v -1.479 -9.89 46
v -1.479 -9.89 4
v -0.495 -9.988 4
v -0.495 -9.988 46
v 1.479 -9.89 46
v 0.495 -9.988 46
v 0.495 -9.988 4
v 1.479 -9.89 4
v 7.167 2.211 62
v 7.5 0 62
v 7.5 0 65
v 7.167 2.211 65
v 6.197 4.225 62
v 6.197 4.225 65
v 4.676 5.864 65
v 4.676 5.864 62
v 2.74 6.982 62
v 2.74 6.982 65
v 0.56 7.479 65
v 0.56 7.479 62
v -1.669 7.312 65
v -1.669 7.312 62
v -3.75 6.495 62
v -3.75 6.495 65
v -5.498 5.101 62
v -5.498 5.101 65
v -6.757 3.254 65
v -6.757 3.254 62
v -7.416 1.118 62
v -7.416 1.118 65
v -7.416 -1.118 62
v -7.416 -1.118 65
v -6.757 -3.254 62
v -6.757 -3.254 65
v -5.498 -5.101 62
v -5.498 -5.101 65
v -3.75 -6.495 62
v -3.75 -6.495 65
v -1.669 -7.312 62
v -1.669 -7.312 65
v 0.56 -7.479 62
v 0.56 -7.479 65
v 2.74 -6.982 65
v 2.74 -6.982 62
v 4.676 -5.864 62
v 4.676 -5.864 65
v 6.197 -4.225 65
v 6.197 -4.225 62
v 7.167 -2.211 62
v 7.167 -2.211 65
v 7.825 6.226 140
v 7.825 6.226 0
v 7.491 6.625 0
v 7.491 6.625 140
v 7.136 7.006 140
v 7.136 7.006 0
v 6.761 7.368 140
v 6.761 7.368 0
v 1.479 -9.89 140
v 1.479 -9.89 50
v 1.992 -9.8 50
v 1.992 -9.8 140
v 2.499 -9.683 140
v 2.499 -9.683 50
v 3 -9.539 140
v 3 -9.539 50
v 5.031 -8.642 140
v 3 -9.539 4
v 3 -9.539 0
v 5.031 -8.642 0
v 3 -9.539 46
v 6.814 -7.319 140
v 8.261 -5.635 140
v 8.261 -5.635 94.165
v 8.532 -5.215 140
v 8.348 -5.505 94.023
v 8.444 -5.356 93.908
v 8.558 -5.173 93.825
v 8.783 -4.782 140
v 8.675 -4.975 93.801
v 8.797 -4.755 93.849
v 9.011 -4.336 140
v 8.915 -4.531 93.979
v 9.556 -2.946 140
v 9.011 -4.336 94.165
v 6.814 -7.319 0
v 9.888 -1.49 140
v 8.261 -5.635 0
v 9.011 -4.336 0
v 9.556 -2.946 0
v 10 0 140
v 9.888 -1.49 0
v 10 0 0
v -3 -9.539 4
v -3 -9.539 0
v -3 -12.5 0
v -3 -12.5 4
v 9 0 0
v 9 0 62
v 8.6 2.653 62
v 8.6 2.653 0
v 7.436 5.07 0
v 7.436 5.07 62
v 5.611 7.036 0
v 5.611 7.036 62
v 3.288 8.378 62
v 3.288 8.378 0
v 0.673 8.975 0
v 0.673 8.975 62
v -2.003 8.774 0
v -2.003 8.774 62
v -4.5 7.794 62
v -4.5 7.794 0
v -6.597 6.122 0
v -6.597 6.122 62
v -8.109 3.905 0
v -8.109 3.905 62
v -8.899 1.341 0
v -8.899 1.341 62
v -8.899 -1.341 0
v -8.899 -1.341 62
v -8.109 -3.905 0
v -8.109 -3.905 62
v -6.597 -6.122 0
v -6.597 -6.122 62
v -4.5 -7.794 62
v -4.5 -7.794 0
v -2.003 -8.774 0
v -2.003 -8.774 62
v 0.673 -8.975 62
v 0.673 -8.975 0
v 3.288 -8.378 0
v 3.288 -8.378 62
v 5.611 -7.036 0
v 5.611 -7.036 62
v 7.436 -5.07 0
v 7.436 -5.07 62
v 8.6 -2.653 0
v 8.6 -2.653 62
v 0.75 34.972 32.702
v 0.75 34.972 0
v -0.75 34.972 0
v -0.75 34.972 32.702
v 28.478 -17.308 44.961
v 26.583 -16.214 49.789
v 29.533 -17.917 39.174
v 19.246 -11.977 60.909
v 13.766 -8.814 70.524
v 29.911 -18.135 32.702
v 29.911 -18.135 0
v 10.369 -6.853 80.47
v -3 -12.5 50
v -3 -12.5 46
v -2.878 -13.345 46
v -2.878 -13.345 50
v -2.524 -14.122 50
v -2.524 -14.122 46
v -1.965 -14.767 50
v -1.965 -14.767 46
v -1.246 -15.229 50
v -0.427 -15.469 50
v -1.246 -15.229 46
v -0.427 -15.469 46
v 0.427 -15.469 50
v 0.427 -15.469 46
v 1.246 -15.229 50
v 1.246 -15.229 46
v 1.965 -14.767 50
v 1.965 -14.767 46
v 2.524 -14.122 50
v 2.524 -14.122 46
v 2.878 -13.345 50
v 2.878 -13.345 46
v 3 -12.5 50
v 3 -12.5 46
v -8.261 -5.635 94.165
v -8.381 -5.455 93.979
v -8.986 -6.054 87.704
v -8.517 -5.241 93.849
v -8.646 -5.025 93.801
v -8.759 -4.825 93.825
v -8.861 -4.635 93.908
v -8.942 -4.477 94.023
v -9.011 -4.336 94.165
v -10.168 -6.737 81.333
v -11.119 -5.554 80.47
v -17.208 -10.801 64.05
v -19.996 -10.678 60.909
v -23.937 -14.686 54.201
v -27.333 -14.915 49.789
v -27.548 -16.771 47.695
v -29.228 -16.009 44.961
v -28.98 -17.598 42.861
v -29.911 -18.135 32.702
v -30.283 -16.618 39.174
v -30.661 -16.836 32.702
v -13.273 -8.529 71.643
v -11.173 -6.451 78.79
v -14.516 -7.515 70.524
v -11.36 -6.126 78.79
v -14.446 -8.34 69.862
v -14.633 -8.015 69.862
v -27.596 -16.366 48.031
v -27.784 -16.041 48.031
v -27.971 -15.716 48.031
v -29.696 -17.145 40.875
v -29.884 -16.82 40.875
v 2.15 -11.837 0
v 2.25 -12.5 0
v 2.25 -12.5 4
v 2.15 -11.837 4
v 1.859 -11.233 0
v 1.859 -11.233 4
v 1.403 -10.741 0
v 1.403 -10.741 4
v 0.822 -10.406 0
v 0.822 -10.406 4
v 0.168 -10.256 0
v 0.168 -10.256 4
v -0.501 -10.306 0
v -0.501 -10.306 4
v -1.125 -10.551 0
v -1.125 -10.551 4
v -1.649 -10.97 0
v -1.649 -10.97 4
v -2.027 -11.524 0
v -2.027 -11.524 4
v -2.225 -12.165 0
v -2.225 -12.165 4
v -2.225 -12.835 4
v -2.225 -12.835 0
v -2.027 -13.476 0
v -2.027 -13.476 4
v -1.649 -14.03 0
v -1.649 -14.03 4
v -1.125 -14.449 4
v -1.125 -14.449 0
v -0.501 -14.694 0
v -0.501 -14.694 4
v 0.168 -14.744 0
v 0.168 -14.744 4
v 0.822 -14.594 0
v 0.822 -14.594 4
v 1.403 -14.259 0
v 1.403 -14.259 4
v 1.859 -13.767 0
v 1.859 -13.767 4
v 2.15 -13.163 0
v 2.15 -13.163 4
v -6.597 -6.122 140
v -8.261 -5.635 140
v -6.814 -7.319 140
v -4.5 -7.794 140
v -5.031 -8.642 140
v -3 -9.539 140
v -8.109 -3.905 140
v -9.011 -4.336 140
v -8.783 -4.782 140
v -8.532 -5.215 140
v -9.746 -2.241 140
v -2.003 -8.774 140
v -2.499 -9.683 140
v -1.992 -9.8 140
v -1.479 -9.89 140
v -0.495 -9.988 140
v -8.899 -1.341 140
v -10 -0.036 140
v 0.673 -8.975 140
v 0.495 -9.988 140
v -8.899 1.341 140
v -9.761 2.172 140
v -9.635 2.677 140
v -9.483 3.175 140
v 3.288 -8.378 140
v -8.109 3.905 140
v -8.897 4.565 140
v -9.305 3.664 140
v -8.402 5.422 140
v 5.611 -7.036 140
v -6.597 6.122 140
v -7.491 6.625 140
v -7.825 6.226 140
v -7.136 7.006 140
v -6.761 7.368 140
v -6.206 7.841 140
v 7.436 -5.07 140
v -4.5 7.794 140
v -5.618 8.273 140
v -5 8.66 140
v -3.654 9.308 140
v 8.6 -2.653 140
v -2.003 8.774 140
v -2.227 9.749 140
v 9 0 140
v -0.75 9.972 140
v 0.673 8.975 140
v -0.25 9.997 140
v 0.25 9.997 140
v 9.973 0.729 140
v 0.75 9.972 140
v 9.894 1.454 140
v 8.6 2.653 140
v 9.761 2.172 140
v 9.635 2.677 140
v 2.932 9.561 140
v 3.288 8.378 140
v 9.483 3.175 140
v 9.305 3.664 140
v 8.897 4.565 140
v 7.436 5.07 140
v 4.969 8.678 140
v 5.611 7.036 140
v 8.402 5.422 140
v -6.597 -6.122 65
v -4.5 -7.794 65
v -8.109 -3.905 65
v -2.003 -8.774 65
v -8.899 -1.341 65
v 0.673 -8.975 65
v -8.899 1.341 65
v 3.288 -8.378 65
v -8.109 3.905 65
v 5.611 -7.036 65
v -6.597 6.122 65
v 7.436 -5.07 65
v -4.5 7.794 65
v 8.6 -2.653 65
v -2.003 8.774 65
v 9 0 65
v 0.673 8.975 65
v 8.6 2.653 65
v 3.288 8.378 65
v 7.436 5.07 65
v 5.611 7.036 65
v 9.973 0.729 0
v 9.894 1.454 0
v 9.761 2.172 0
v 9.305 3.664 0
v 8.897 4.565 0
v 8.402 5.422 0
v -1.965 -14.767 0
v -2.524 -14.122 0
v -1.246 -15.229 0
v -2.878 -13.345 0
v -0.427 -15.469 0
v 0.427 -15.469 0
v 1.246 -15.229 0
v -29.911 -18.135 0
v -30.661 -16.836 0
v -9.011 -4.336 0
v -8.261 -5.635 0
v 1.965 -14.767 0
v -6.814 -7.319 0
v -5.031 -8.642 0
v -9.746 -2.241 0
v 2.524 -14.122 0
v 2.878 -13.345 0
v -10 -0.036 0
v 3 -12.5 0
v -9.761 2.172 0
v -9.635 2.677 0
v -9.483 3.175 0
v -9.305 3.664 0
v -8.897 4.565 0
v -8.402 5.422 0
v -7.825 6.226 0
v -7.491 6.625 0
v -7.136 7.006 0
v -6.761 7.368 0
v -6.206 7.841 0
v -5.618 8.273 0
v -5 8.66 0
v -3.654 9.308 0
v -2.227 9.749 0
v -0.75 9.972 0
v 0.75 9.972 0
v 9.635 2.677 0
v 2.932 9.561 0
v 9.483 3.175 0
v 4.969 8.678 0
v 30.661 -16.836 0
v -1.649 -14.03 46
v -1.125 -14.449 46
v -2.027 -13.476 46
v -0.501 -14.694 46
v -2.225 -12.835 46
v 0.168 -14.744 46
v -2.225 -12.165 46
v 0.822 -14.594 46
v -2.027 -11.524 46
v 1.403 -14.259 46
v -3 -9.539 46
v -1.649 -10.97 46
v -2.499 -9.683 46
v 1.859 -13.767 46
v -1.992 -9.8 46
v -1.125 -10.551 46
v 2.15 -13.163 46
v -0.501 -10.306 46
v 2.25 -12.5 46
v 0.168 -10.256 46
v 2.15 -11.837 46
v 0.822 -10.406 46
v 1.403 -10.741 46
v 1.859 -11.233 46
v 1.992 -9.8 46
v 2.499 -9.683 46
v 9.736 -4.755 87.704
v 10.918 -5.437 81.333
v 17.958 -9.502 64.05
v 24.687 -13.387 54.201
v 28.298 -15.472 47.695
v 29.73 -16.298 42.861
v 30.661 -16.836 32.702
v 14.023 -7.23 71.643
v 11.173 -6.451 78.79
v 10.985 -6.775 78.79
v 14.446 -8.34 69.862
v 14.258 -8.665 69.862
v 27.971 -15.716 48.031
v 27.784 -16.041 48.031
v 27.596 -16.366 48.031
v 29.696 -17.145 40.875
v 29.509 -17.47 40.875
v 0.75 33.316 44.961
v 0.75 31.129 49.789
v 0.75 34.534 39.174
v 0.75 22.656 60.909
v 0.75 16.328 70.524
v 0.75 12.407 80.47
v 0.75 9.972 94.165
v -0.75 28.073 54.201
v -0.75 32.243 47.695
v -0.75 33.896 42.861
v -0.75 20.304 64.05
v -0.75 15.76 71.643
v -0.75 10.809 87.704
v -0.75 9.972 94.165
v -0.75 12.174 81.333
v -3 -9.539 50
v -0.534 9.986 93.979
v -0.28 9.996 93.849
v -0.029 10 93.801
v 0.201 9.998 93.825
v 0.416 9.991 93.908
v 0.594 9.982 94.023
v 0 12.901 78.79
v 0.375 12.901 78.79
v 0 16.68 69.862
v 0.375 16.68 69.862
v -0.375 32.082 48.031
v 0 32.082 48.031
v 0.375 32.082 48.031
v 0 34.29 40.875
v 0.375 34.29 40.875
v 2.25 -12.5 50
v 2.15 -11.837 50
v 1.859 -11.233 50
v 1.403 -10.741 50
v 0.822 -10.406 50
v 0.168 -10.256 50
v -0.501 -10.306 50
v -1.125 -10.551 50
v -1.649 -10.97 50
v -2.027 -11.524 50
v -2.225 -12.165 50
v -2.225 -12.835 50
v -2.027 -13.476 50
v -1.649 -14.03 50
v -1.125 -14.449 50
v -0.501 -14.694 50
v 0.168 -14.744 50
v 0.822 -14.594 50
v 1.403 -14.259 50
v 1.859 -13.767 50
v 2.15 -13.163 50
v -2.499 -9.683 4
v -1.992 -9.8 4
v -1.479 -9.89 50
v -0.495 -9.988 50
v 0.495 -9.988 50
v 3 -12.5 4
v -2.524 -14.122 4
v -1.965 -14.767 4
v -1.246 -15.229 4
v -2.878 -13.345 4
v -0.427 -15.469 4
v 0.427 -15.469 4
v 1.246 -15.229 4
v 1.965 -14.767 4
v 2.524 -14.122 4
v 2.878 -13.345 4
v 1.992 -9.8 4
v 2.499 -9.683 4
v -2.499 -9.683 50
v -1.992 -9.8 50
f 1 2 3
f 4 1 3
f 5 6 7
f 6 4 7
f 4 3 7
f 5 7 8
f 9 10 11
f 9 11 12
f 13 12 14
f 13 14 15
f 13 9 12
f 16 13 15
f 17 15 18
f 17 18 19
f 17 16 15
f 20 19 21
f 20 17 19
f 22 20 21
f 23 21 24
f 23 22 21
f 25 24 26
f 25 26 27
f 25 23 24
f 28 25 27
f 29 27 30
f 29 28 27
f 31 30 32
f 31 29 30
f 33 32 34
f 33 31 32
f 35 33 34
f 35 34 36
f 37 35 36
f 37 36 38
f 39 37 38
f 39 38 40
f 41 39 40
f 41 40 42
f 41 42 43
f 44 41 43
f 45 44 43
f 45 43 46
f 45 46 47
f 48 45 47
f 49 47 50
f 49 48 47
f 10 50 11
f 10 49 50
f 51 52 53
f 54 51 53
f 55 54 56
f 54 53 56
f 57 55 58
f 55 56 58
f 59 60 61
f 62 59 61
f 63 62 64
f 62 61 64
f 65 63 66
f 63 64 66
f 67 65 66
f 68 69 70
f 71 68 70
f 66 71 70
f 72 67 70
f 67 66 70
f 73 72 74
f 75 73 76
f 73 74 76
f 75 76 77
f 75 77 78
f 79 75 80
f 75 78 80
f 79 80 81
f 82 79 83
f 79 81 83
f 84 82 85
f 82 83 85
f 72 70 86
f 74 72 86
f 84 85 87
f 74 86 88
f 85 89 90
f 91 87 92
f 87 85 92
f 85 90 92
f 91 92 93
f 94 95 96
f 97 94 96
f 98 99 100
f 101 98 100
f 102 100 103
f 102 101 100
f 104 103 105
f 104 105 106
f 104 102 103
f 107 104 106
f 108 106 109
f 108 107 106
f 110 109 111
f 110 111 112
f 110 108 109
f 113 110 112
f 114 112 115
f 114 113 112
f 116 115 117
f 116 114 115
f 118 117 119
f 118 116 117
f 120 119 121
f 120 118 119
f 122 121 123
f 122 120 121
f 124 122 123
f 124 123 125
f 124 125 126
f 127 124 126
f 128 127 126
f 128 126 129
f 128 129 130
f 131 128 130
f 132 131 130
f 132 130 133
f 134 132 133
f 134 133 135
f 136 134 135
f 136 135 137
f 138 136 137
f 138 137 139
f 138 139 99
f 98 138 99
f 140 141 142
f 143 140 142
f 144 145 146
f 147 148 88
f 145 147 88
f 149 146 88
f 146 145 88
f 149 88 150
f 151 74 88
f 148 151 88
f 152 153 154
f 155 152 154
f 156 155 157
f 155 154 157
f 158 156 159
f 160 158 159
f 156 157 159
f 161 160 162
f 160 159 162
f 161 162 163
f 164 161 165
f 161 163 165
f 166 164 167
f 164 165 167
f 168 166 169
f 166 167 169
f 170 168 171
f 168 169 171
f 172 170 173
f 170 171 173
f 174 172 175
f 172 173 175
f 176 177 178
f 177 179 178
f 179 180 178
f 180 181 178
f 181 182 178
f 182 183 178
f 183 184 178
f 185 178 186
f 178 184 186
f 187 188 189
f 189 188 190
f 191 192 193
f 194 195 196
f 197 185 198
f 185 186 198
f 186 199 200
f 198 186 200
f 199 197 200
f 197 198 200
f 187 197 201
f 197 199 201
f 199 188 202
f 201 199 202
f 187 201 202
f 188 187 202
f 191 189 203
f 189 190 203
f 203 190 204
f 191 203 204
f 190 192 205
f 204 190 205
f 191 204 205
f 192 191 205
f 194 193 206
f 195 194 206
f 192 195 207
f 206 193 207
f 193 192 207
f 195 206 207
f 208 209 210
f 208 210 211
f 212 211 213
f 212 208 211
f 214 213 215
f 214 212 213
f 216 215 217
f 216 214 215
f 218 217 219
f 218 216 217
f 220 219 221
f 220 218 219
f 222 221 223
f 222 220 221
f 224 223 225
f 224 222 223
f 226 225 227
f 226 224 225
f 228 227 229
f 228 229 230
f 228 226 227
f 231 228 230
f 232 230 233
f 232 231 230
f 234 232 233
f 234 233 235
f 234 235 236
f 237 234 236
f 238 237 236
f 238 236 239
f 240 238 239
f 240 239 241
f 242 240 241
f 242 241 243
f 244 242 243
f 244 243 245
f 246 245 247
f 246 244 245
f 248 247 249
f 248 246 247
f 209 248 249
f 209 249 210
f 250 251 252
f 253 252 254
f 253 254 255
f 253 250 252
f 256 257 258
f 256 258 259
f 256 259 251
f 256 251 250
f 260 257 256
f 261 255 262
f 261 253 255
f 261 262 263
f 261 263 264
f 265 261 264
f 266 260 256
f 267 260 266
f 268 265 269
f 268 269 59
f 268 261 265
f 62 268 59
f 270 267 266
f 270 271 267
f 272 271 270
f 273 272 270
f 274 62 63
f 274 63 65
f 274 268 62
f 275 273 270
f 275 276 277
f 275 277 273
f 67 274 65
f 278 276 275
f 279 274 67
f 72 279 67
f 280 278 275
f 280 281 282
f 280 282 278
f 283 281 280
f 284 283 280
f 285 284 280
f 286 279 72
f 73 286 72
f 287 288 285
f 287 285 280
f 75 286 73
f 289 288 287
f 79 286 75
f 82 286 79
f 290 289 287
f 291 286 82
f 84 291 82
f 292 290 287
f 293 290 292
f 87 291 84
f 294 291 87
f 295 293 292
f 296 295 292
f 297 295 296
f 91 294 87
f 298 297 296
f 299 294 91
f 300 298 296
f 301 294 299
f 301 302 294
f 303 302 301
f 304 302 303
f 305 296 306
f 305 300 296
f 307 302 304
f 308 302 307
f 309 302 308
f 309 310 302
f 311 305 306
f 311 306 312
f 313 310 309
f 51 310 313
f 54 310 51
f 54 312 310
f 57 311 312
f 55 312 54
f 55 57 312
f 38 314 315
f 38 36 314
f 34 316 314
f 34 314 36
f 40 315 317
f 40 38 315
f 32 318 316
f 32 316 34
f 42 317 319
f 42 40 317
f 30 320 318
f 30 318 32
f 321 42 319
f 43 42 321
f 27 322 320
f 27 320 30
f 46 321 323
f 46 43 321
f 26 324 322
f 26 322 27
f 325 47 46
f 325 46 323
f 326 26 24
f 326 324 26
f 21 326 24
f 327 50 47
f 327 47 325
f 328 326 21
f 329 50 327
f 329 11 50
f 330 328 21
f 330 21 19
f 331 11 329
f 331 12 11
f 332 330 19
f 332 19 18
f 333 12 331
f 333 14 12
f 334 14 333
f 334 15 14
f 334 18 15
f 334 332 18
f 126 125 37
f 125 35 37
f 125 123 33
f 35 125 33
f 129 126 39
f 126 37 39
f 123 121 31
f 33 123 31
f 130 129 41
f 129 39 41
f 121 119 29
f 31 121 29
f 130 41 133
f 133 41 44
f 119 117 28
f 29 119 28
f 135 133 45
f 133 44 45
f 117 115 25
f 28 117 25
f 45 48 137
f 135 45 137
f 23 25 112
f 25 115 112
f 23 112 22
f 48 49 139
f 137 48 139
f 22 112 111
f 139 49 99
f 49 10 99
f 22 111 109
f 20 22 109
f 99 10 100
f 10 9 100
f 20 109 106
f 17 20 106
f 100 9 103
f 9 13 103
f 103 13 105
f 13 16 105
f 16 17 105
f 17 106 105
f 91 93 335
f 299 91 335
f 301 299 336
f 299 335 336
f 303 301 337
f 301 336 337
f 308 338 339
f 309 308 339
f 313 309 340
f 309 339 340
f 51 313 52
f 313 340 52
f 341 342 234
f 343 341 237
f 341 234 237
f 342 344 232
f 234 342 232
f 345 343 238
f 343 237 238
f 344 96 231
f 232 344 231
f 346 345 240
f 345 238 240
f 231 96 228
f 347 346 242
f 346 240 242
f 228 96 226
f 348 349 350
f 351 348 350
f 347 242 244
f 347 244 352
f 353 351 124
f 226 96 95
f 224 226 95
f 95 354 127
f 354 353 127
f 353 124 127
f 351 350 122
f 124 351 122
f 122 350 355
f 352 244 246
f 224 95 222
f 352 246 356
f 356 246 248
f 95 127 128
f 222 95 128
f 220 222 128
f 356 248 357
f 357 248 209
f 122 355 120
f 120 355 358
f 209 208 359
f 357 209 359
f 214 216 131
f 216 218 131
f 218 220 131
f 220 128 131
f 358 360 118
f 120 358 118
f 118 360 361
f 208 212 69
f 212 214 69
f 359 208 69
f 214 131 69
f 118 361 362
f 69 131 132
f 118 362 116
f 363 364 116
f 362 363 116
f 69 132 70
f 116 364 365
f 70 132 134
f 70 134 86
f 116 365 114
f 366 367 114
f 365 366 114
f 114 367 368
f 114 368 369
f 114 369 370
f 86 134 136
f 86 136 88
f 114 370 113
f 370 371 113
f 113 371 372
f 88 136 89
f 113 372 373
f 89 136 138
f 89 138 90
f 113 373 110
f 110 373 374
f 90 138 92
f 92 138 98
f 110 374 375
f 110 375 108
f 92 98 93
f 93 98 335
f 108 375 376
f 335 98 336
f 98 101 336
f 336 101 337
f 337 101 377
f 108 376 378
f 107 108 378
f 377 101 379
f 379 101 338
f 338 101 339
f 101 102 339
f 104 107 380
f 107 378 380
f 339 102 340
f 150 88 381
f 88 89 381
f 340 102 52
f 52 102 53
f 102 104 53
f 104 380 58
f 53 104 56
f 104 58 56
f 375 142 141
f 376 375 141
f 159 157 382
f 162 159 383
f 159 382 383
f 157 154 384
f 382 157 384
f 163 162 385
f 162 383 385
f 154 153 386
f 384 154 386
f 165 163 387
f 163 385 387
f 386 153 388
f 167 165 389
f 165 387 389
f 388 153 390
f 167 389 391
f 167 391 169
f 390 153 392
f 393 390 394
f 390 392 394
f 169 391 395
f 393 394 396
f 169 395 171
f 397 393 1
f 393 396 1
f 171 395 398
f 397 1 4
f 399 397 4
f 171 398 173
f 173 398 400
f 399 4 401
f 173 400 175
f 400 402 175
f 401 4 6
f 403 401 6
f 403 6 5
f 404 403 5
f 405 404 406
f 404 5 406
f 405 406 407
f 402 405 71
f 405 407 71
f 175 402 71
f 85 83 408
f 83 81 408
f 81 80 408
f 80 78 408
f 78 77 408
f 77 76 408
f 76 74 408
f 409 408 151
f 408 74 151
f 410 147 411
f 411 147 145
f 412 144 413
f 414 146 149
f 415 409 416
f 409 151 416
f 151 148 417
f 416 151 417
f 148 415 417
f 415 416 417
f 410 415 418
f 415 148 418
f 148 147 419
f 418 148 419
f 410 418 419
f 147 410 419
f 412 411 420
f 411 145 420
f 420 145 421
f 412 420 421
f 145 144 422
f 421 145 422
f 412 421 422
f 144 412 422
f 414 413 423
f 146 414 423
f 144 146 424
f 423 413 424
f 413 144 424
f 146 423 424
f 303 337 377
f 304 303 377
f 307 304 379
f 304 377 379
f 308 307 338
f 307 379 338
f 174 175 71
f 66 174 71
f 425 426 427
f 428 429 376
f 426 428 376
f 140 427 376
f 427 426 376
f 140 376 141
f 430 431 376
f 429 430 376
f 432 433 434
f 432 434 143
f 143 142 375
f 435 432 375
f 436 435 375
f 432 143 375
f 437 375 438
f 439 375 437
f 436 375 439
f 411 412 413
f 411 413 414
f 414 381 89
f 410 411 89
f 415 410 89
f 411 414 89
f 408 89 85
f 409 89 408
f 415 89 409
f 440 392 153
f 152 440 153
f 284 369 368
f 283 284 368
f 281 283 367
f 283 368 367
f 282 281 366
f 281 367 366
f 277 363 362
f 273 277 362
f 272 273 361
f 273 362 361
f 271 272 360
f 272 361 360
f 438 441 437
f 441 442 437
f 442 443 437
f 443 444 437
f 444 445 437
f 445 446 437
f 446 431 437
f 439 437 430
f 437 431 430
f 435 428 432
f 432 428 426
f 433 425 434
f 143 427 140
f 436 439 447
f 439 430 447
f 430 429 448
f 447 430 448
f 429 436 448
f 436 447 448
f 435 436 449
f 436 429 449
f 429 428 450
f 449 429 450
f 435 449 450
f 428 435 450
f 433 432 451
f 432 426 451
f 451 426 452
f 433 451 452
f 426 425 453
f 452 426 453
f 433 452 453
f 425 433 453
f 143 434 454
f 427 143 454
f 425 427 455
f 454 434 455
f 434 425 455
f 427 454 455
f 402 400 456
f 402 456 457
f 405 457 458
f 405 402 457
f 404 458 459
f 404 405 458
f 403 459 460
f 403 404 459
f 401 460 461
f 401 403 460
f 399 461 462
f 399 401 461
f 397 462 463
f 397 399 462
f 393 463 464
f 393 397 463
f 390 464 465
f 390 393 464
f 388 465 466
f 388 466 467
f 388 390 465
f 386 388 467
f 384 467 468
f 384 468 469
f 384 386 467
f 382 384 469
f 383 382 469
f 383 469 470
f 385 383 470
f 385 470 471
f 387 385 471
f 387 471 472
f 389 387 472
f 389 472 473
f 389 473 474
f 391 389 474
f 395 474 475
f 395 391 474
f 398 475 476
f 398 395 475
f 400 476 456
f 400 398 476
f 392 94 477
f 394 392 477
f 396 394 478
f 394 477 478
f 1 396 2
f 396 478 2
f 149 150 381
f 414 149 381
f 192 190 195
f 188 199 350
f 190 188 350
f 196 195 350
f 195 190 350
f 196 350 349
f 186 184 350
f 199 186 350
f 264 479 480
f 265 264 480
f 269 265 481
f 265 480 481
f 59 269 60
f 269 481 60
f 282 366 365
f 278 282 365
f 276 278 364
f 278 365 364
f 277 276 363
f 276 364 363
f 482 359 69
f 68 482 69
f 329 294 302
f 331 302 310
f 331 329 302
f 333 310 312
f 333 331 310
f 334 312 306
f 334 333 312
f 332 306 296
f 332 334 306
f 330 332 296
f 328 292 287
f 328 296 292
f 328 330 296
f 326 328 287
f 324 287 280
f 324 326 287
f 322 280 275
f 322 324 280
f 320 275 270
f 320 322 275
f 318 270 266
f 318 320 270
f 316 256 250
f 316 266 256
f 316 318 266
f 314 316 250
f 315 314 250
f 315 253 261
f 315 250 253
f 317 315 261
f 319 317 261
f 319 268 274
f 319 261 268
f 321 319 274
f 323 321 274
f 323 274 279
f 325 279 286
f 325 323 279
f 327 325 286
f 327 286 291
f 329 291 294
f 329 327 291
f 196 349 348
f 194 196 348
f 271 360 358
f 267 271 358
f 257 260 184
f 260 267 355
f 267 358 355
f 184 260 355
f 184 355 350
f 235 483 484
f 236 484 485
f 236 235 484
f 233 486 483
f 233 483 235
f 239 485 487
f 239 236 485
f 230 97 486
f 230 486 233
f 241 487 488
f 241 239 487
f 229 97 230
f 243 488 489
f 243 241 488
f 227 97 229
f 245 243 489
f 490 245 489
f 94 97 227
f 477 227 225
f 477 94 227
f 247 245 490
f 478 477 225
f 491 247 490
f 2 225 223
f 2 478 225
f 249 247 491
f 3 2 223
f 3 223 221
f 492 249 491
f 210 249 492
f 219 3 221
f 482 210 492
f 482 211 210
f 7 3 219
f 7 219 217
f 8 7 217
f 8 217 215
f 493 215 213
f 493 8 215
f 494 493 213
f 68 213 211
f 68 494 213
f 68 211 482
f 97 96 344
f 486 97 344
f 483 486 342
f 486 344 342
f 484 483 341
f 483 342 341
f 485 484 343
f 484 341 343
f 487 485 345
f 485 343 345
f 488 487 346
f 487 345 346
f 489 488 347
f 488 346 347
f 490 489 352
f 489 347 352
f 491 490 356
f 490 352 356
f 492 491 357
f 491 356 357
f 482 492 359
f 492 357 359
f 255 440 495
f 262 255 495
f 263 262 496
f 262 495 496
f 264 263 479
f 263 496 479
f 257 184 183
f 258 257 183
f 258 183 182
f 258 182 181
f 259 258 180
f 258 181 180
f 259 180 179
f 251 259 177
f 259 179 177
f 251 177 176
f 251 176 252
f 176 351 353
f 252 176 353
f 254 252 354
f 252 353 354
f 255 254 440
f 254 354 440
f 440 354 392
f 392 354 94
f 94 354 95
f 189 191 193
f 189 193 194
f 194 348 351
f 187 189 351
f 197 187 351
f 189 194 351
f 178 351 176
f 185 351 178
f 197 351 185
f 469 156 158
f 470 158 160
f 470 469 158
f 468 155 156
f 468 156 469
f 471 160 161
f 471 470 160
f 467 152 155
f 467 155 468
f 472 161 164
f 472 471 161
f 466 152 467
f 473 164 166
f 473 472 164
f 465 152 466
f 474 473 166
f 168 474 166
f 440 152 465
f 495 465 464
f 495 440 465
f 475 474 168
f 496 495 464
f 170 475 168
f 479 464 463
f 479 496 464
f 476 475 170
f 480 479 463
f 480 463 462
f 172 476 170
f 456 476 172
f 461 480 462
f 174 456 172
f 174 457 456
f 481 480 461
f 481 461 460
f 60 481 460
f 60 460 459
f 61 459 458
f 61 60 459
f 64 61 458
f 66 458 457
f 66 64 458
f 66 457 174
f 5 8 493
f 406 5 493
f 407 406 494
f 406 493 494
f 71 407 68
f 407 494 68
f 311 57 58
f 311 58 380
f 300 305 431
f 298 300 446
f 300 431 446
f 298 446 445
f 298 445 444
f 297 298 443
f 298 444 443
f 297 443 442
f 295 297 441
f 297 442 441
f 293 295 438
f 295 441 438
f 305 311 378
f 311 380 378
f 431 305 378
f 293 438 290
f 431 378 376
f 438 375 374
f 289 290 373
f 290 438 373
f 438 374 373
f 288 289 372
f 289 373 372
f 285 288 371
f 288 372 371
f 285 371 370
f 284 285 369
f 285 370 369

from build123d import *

# Parameters (mm, degrees)
F0_R     = 9
F1_DEPTH = 140
F2_DEPTH = 100
F4_DEPTH = 10.751
F5_COUNT = 3
F0_R_2   = 2.25
F6_DEPTH = 4
F7_START = 46
F7_DEPTH = 4
F8_START = 62
F0_R_3   = 7.5
F8_DEPTH = 3


# Not quite as in the source:
# - a feature names something its author has since deleted; it is built from what else it names


with BuildPart() as f1:
    # F0 (on Top) → F1 (new body)
    with BuildSketch(Plane.XY):
        with BuildLine():
            ThreePointArc((-3, -9.5393920142), (-2.2464281062, -9.744411771), (-1.4791551643, -9.89))
            ThreePointArc((-1.4791551643, -9.89), (0, -10), (1.4791551643, -9.89))
            ThreePointArc((1.4791551643, -9.89), (2.2464281062, -9.744411771), (3, -9.5393920142))
            ThreePointArc((3, -9.5393920142), (8.0622577483, -5.9160797831), (10, 0))
            ThreePointArc((10, 0), (7.3314391493, 6.8007352544), (0.75, 9.9718353376))
            ThreePointArc((0.75, 9.9718353376), (0, 10), (-0.75, 9.9718353376))
            ThreePointArc((-0.75, 9.9718353376), (-9.9341644436, 1.1455901566), (-3, -9.5393920142))
        make_face()
        Circle(F0_R, mode=Mode.SUBTRACT)
    extrude(amount=F1_DEPTH)

    # F0 (on Top) → F2 (join)
    with BuildSketch(Plane.XY):
        with BuildLine():
            Line((-0.75, 34.9718353376), (-0.75, 9.9718353376))
            ThreePointArc((-0.75, 9.9718353376), (0, 10), (0.75, 9.9718353376))
            Line((0.75, 9.9718353376), (0.75, 34.9718353376))
            Line((0.75, 34.9718353376), (-0.75, 34.9718353376))
        make_face()
    extrude(amount=F2_DEPTH)

    # F3 (on face) → F4 (cut, through all)
    with BuildSketch(Plane.YZ.offset(0.75)):
        with BuildLine():
            Line((34.9718353376, 100), (9.9718353376, 100))
            Line((9.9718353376, 100), (9.9718353376, 94.1647440576))
            add(Edge.make_bspline(
                [(9.9718353376, 94.1647440576), (10.1832449594, 91.2204140215), (12.0836351221, 77.2918027042), (20.9708053433, 61.8272021249), (33.801245613, 48.6414831262), (34.7842815391, 38.599508776), (34.9718353376, 32.702038365)],
                knots=[0.0899218527, 0.0899218527, 0.0899218527, 0.0899218527, 0.2371904705, 0.3995520788, 0.5544857931, 0.7015059428, 0.7015059428, 0.7015059428, 0.7015059428], degree=3))
            Line((34.9718353376, 32.702038365), (34.9718353376, 100))
        make_face()
    extrude(amount=-F4_DEPTH, mode=Mode.SUBTRACT)


with BuildPart() as f5_1:
    # F5: instance of F1
    add(f1.part.rotate(Axis((0, 0, 0), (0, 0, 1)), 1 * 360 / F5_COUNT))


with BuildPart() as f5_2:
    # F5: instance of F1
    add(f1.part.rotate(Axis((0, 0, 0), (0, 0, 1)), 2 * 360 / F5_COUNT))


with BuildPart() as f1_1:
    add(f1.part)

    add(f5_1.part)  # F6 merges F5_1

    add(f5_2.part)  # F6 merges F5_2
    # F0 (on Top) → F6 (join)
    with BuildSketch(Plane.XY):
        with BuildLine():
            ThreePointArc((1.4791551643, -9.89), (0, -10), (-1.4791551643, -9.89))
            ThreePointArc((-1.4791551643, -9.89), (-2.592051841, -10.9896135416), (-3, -12.5))
            ThreePointArc((-3, -12.5), (0, -15.5), (3, -12.5))
            ThreePointArc((3, -12.5), (2.592051841, -10.9896135416), (1.4791551643, -9.89))
        make_face()
        with Locations((0, -12.5)):
            Circle(F0_R_2, mode=Mode.SUBTRACT)
        with BuildLine():
            ThreePointArc((-3, -12.5), (-2.592051841, -10.9896135416), (-1.4791551643, -9.89))
            ThreePointArc((-1.4791551643, -9.89), (-2.2464281062, -9.744411771), (-3, -9.5393920142))
            Line((-3, -9.5393920142), (-3, -12.5))
        make_face()
        with BuildLine():
            ThreePointArc((3, -9.5393920142), (2.2464281062, -9.744411771), (1.4791551643, -9.89))
            ThreePointArc((1.4791551643, -9.89), (2.592051841, -10.9896135416), (3, -12.5))
            Line((3, -12.5), (3, -9.5393920142))
        make_face()
    extrude(amount=F6_DEPTH)

    # F0 (on Top) → F7 (join)
    with BuildSketch(Plane.XY.offset(F7_START)):
        with BuildLine():
            ThreePointArc((1.4791551643, -9.89), (0, -10), (-1.4791551643, -9.89))
            ThreePointArc((-1.4791551643, -9.89), (-2.592051841, -10.9896135416), (-3, -12.5))
            ThreePointArc((-3, -12.5), (0, -15.5), (3, -12.5))
            ThreePointArc((3, -12.5), (2.592051841, -10.9896135416), (1.4791551643, -9.89))
        make_face()
        with Locations((0, -12.5)):
            Circle(F0_R_2, mode=Mode.SUBTRACT)
        with BuildLine():
            ThreePointArc((-3, -12.5), (-2.592051841, -10.9896135416), (-1.4791551643, -9.89))
            ThreePointArc((-1.4791551643, -9.89), (-2.2464281062, -9.744411771), (-3, -9.5393920142))
            Line((-3, -9.5393920142), (-3, -12.5))
        make_face()
        with BuildLine():
            ThreePointArc((3, -9.5393920142), (2.2464281062, -9.744411771), (1.4791551643, -9.89))
            ThreePointArc((1.4791551643, -9.89), (2.592051841, -10.9896135416), (3, -12.5))
            Line((3, -12.5), (3, -9.5393920142))
        make_face()
    extrude(amount=F7_DEPTH)

    # F0 (on Top) → F8 (join)
    with BuildSketch(Plane.XY.offset(F8_START)):
        Circle(F0_R)
        Circle(F0_R_3, mode=Mode.SUBTRACT)
    extrude(amount=F8_DEPTH)


solid = f1_1.part
